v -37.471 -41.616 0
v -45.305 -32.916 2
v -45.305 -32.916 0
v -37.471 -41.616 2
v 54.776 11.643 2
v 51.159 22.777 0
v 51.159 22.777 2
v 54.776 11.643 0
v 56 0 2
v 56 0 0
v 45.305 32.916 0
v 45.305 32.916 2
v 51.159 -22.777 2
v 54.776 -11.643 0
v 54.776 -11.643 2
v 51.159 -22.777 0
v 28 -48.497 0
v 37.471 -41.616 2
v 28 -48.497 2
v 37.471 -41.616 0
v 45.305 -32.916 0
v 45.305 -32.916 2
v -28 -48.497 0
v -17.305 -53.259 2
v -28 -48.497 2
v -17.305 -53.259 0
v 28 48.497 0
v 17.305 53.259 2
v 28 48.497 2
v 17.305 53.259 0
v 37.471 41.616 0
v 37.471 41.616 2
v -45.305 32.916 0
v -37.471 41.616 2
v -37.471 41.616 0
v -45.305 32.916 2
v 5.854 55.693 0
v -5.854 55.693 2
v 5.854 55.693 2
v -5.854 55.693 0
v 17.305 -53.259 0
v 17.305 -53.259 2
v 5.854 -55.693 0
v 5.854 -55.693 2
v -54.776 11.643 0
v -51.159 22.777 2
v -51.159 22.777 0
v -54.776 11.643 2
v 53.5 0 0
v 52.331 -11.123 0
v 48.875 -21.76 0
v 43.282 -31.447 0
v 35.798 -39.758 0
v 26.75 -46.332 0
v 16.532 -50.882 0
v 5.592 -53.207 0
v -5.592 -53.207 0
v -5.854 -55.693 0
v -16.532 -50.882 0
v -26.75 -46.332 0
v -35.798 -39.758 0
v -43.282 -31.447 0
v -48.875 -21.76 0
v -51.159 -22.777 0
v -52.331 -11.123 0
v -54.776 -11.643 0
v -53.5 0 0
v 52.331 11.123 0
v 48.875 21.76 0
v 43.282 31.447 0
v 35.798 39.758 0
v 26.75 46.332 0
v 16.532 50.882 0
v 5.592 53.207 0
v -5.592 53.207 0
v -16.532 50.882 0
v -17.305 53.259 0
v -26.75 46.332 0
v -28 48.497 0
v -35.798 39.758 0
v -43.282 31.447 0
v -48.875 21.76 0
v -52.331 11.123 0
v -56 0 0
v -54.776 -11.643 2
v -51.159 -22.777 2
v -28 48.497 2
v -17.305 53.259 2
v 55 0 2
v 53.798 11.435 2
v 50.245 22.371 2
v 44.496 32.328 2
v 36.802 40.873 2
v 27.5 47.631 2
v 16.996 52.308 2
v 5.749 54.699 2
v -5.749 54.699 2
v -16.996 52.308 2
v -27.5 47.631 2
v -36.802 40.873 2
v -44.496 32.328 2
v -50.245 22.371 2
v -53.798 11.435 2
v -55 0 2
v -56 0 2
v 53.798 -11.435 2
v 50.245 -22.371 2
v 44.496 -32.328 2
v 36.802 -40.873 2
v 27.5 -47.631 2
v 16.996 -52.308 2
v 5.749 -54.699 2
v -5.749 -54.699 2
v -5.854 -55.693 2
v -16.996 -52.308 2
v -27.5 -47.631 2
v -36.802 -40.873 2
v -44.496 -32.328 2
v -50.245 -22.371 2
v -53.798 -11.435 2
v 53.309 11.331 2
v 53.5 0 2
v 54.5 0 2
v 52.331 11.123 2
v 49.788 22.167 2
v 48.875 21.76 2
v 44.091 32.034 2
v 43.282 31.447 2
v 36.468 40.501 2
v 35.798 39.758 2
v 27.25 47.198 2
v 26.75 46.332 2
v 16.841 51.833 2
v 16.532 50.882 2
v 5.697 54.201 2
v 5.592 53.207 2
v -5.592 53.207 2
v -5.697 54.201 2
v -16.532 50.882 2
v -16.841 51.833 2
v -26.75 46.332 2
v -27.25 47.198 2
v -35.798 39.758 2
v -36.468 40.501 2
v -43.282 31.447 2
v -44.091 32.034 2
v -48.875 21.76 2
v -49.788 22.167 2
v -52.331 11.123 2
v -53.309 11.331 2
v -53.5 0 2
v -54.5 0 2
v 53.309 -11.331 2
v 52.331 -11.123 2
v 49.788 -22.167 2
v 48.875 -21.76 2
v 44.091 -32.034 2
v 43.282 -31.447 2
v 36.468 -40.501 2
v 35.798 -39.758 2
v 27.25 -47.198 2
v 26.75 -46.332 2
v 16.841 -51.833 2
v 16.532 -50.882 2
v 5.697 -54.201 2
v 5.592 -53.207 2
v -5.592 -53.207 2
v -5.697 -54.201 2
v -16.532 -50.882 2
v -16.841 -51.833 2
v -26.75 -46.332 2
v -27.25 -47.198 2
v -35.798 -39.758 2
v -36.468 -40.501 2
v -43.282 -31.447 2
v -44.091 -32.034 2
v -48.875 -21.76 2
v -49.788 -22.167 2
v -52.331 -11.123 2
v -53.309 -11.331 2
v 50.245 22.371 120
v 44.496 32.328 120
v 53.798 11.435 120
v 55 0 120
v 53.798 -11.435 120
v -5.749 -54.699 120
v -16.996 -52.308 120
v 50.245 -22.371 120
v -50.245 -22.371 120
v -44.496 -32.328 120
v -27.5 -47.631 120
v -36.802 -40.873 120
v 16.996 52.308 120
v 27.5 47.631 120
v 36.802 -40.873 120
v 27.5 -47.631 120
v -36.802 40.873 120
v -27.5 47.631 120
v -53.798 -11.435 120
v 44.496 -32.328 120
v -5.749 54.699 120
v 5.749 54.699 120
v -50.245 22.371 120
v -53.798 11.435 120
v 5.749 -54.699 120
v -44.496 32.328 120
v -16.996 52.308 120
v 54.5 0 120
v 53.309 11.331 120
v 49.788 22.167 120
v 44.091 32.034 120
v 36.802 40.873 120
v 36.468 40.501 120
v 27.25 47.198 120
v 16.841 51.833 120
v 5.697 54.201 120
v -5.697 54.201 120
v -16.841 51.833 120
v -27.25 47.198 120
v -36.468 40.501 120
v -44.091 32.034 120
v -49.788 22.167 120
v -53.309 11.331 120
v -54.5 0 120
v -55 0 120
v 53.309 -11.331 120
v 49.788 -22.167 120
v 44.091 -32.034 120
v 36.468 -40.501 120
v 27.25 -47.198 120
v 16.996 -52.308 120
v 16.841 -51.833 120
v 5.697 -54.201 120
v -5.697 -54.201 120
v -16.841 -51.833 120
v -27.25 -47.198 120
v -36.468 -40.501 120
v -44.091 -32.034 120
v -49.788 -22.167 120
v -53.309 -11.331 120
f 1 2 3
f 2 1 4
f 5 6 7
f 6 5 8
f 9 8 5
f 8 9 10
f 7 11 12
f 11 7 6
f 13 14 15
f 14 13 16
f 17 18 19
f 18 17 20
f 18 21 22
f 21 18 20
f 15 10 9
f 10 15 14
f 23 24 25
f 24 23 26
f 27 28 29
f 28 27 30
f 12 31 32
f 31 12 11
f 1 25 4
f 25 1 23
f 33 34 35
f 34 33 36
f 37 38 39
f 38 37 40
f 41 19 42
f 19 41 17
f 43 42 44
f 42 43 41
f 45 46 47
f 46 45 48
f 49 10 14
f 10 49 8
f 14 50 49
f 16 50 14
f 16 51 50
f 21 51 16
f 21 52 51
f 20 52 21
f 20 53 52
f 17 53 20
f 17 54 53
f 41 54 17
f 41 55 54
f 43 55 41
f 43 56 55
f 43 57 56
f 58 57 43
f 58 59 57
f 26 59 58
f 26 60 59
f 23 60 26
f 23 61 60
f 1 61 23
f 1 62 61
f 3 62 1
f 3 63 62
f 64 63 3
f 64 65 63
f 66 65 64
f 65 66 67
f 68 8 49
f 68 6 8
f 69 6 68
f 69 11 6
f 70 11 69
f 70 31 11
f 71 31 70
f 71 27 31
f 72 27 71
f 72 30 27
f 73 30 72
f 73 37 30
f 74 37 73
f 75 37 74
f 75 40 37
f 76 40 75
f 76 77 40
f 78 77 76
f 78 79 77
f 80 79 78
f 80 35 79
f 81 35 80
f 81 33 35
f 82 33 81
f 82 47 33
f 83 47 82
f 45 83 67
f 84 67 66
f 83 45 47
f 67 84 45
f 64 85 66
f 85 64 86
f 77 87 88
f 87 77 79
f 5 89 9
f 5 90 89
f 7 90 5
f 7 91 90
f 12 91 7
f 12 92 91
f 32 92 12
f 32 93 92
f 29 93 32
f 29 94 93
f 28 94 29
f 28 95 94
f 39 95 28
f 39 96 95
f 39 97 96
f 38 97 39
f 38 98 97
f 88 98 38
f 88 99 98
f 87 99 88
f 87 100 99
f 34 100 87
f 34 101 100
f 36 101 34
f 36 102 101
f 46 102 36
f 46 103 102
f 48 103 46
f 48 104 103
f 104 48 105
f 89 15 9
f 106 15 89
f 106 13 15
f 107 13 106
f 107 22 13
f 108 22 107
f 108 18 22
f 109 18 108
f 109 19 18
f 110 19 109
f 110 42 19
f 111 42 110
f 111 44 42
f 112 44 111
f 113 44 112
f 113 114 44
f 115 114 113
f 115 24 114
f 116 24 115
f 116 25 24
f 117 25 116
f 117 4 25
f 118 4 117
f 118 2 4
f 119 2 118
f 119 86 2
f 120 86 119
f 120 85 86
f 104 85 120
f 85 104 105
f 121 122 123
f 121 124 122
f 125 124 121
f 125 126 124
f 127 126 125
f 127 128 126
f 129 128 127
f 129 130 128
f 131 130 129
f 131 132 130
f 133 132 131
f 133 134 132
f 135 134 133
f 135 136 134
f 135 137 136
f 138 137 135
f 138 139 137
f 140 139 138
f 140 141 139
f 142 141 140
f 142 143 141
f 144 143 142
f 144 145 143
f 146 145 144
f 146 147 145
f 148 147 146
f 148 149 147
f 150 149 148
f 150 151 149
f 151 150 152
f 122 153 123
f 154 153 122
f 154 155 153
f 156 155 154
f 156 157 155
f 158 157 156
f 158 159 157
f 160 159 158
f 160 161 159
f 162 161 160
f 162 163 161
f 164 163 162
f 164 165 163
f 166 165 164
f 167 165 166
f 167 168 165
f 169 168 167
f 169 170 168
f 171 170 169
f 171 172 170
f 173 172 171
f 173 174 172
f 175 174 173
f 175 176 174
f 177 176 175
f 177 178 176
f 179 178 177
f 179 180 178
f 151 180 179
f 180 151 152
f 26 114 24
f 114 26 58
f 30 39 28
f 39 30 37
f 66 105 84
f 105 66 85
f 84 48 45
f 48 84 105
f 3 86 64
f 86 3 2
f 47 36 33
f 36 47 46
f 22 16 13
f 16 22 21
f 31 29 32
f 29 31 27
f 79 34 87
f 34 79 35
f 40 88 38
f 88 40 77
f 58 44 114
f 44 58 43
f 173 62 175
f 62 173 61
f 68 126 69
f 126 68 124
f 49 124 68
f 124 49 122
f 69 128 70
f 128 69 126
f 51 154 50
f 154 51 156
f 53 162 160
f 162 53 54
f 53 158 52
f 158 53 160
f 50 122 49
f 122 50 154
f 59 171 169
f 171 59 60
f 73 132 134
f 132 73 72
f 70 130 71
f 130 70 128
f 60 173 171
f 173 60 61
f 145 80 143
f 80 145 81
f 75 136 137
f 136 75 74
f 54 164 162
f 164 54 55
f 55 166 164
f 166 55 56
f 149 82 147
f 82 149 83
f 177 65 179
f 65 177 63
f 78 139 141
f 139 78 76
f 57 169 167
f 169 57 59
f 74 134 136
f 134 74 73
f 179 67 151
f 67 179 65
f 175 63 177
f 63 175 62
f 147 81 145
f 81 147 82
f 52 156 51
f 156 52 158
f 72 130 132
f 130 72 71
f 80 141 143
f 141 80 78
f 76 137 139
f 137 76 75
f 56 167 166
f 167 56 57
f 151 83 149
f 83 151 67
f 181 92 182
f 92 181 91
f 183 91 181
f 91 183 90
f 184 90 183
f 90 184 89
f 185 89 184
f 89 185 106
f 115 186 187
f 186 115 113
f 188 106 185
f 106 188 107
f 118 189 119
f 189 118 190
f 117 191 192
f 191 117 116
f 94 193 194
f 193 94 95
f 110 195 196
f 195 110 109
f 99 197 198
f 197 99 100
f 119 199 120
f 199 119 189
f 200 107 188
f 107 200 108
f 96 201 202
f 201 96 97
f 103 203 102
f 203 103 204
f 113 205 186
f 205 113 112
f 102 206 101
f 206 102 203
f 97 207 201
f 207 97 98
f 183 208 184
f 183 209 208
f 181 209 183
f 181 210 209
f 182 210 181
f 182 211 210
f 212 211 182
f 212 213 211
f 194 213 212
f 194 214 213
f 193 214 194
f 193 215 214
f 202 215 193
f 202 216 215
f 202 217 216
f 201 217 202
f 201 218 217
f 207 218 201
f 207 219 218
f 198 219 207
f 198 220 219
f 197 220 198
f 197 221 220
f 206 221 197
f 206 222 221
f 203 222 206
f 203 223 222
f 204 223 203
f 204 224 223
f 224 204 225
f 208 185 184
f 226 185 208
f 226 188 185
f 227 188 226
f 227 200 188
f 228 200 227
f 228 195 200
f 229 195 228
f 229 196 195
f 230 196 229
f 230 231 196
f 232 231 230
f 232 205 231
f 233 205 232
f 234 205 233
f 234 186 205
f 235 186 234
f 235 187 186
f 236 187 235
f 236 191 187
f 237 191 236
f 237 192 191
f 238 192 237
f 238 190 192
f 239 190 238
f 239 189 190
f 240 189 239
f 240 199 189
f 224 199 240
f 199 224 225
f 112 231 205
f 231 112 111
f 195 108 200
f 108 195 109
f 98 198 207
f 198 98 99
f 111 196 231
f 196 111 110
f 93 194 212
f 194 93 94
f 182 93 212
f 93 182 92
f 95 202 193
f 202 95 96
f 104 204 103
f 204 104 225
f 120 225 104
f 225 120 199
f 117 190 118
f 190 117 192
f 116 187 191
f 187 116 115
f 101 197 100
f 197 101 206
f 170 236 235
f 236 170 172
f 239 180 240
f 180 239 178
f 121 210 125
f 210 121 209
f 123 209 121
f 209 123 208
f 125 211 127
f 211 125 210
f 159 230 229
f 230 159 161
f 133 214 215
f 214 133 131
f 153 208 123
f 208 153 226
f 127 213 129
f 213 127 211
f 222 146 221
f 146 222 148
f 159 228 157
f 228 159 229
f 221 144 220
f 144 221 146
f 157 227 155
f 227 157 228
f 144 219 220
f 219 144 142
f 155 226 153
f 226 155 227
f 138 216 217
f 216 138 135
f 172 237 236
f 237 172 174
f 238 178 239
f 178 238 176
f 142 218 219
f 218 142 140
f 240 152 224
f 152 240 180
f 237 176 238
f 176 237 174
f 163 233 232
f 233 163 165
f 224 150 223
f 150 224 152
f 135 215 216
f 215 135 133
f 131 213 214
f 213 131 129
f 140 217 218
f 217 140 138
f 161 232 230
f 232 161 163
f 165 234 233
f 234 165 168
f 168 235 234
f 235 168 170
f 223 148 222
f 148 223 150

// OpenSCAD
union()
{
difference()
{
cylinder(
	d=112,
	h=2
);
cylinder(
	d=107,
	h=2
);
}
difference()
{
cylinder(
	d=110,
	h=120
);
cylinder(
	d=109,
	h=120
);
}
}
